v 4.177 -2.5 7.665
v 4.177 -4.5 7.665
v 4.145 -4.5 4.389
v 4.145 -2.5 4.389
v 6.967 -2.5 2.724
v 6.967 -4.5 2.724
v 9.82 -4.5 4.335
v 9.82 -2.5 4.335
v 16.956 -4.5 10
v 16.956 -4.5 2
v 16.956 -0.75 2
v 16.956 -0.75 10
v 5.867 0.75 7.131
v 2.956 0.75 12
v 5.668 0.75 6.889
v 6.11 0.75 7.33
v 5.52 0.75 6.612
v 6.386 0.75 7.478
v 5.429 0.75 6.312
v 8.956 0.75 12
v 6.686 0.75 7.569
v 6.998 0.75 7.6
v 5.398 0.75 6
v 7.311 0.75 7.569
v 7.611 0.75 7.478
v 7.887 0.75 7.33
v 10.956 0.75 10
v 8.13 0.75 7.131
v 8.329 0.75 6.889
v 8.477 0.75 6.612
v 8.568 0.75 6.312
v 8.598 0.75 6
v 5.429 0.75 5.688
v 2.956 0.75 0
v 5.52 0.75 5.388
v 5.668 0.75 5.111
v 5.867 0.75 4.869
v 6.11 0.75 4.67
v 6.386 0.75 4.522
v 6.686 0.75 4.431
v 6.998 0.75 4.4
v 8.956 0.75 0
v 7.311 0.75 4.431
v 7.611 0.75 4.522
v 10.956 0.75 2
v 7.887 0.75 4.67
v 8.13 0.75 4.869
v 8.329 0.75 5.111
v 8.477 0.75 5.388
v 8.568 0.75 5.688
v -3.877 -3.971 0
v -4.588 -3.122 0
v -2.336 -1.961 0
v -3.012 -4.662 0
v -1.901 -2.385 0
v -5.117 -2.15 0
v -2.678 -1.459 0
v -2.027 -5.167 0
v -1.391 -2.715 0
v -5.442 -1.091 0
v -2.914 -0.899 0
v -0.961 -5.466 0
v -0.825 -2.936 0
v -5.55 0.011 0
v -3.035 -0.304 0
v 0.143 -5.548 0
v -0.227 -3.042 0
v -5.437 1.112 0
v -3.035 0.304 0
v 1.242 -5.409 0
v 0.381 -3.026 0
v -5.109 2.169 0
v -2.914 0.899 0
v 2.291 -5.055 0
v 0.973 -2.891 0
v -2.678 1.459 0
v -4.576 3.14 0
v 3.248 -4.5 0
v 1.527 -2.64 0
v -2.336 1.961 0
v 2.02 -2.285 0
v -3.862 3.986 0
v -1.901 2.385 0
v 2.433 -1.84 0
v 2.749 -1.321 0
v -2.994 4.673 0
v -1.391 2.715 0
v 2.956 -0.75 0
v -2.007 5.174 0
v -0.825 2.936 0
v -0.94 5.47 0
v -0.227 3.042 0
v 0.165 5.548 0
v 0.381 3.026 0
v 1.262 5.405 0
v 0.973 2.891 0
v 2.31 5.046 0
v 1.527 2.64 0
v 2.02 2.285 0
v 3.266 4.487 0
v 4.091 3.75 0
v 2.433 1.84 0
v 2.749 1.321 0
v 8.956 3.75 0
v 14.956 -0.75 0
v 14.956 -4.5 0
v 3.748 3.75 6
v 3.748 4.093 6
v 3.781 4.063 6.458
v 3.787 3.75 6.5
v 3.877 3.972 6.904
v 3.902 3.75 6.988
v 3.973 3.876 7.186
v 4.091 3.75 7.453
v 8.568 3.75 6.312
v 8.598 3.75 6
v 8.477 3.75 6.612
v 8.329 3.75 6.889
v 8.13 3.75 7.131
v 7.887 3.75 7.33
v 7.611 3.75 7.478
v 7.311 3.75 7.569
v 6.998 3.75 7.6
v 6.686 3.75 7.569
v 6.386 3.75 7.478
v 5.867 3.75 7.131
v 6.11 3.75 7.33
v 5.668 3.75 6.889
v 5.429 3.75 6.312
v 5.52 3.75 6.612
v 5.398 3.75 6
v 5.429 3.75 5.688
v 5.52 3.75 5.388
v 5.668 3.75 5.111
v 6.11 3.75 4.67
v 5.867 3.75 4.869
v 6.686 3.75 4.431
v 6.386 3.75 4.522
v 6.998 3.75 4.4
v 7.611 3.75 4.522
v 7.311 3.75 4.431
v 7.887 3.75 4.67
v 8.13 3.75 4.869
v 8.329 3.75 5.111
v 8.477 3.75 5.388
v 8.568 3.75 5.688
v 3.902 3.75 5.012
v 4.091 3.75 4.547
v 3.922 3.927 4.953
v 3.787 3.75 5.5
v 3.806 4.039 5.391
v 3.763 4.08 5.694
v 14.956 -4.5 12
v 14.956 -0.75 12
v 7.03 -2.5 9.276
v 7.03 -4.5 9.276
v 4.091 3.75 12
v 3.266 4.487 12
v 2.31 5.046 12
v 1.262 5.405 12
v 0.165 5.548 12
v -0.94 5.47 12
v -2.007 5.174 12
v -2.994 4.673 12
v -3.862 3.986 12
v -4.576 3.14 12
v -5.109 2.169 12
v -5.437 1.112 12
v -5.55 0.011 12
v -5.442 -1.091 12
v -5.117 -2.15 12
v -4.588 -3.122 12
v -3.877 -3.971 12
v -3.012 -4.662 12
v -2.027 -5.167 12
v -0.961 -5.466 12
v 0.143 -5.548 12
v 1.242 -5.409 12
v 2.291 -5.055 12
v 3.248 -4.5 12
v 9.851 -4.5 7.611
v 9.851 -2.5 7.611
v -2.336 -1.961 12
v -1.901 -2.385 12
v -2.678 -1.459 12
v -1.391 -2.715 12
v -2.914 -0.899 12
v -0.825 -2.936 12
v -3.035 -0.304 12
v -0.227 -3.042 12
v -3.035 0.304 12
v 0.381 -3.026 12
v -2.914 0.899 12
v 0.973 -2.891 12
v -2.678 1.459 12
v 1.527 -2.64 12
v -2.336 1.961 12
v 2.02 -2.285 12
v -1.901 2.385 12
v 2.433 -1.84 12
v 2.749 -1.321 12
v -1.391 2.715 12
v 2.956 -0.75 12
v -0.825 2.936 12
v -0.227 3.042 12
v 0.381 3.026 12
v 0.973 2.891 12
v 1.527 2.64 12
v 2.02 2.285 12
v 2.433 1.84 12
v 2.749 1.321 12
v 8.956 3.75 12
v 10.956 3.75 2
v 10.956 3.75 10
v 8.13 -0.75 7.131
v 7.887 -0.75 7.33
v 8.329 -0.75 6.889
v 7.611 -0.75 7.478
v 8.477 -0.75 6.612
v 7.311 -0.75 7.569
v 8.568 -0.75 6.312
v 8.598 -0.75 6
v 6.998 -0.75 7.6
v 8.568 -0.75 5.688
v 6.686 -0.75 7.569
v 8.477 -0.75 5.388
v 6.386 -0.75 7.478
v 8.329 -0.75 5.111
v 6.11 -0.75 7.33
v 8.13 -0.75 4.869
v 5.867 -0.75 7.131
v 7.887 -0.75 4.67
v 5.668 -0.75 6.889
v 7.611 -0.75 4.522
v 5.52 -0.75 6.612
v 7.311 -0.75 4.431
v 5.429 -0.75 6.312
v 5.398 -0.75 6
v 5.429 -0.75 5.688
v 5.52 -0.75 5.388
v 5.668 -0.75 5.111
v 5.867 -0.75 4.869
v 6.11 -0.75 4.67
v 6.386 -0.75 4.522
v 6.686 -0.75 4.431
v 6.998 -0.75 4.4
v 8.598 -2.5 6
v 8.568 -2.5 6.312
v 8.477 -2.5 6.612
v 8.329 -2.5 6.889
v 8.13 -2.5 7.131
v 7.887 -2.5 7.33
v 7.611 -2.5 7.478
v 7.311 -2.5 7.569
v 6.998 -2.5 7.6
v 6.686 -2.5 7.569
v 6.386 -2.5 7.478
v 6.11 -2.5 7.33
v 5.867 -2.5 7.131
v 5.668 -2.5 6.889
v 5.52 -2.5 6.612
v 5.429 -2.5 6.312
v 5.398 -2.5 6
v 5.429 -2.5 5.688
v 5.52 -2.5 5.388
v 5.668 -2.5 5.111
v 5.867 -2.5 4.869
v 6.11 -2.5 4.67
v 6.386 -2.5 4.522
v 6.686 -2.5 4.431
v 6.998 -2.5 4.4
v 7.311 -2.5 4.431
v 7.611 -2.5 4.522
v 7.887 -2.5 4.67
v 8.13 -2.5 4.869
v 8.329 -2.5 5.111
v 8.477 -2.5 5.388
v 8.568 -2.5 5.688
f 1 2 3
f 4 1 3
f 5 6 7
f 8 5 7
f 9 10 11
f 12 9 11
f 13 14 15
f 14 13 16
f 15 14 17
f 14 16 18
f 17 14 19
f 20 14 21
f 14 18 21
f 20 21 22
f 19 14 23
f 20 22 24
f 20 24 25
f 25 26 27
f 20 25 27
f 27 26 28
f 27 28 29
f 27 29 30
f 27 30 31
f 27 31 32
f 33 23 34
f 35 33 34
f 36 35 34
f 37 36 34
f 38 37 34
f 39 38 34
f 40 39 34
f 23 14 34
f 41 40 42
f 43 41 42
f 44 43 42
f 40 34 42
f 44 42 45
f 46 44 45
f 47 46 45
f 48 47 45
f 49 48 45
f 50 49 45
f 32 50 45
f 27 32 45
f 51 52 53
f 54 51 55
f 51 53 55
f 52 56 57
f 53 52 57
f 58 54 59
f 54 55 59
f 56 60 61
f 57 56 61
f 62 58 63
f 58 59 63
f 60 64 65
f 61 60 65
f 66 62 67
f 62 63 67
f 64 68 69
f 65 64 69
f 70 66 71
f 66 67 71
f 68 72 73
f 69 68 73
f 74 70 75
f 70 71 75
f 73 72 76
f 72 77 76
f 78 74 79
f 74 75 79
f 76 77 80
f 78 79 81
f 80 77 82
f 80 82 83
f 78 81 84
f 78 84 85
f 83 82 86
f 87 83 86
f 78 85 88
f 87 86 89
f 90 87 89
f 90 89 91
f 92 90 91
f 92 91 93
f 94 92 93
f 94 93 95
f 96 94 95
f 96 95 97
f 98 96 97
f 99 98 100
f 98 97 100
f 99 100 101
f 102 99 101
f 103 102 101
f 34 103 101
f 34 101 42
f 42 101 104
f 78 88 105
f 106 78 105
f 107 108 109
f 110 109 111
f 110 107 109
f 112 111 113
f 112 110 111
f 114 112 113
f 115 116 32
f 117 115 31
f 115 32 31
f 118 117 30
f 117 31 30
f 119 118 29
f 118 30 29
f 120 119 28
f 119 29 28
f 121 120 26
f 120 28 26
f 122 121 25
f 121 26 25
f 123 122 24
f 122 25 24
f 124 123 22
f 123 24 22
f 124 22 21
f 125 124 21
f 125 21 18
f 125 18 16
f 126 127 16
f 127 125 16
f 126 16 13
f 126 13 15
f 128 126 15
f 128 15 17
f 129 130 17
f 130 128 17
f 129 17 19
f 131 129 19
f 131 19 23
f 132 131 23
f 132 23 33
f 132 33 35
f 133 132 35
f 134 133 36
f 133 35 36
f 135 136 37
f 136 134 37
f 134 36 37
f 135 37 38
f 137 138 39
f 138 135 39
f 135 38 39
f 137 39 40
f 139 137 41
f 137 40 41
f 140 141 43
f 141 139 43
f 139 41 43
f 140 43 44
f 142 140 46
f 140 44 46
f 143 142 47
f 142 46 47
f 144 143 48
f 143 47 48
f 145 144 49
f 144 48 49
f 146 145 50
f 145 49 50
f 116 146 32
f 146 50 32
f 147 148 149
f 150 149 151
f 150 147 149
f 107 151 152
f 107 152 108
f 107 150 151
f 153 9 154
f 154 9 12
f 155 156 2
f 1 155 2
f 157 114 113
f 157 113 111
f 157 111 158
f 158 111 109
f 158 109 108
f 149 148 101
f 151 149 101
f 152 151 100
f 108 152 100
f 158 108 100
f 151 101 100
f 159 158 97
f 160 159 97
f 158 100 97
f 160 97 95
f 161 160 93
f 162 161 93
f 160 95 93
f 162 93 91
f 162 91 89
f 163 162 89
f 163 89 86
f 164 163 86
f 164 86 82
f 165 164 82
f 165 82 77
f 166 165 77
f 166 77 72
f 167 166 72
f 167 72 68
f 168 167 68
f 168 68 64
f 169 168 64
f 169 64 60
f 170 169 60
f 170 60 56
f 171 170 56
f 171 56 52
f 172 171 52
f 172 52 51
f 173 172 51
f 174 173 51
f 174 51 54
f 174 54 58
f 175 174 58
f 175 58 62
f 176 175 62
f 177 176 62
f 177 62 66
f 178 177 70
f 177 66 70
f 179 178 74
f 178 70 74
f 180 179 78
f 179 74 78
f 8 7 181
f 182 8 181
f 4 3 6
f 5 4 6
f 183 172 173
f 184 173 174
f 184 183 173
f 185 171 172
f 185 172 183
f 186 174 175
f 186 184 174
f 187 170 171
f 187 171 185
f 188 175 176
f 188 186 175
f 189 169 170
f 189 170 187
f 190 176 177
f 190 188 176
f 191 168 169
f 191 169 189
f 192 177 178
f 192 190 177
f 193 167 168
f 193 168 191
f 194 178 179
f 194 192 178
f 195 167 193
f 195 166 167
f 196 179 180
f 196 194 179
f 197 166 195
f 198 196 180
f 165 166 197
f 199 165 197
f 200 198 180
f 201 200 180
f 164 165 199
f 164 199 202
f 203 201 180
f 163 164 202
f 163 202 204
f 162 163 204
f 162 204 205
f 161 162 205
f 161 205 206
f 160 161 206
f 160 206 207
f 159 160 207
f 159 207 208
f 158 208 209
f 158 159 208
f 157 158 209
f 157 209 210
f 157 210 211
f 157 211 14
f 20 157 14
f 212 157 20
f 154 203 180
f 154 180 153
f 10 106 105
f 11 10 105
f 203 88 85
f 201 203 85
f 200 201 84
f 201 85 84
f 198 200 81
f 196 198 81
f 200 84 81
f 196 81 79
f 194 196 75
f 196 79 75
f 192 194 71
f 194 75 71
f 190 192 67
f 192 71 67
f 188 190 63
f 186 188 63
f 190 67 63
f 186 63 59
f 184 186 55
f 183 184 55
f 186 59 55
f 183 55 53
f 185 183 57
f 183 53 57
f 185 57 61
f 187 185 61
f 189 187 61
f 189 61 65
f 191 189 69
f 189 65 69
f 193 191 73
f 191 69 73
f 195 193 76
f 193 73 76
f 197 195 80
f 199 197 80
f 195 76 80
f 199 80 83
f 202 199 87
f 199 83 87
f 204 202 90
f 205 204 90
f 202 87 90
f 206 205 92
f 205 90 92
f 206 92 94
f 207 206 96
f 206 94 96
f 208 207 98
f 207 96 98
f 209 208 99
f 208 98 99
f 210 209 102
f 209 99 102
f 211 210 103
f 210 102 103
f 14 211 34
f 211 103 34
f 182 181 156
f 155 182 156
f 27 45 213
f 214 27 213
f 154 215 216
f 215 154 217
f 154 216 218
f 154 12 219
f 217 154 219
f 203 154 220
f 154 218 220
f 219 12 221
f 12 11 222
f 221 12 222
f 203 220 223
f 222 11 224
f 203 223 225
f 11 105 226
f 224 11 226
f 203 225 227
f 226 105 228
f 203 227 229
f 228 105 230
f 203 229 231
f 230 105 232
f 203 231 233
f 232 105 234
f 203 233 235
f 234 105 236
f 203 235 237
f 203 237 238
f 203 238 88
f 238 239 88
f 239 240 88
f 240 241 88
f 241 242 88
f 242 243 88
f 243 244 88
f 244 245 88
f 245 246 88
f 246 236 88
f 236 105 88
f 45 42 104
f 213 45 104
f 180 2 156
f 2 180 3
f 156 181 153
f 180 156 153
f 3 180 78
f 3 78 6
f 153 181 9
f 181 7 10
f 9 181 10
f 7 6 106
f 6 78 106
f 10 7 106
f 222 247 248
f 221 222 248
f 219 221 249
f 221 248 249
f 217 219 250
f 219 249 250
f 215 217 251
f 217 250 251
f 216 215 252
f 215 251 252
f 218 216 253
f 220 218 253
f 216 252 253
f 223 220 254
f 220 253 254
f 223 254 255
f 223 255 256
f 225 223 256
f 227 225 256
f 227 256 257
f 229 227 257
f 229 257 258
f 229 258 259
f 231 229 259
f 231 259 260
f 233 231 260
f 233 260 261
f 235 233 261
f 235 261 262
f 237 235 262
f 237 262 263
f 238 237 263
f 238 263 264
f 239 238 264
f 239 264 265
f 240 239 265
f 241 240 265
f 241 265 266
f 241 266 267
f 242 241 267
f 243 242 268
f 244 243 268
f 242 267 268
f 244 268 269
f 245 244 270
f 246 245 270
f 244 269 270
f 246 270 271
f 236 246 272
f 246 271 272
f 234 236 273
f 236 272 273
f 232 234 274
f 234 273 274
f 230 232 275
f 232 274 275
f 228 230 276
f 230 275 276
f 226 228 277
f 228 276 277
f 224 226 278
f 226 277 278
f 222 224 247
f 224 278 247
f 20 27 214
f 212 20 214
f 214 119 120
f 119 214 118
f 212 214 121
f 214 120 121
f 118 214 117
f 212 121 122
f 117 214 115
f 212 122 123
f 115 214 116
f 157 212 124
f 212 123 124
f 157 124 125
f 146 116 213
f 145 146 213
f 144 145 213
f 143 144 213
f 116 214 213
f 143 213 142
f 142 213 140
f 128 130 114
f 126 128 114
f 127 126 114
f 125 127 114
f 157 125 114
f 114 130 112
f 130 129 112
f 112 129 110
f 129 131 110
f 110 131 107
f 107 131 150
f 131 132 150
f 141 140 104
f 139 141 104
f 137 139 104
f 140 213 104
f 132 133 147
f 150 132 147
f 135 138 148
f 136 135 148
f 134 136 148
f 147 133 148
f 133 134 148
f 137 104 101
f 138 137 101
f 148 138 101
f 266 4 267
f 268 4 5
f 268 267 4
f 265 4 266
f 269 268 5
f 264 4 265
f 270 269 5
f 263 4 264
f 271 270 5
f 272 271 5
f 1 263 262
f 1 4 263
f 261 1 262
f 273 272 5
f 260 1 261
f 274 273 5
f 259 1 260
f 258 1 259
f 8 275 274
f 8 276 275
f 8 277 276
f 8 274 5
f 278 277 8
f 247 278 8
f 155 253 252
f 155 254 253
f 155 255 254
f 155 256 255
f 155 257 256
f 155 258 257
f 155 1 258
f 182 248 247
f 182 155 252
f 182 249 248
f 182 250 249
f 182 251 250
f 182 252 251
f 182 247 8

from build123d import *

# Parameters (mm, degrees)
F1_DEPTH = 12
F2_R     = 1.6
F3_DEPTH = 2
F4_DEPTH = 10.051
F5_R     = 1.6
F6_DEPTH = 25
F7_SIZE  = 2


with BuildPart() as f1:
    # F0 (on Top) → F1 (new body)
    with BuildSketch(Plane.XY):
        with BuildLine():
            ThreePointArc((2.9563490998, -0.75), (-3.05, 0), (2.9563490998, 0.75))
            Line((2.9563490998, 0.75), (10.9563490998, 0.75))
            Line((10.9563490998, 0.75), (10.9563490998, 3.75))
            Line((10.9563490998, 3.75), (4.0914545091, 3.75))
            ThreePointArc((4.0914545091, 3.75), (-5.5212512675, 0.5641670326), (3.2484611742, -4.5))
            Line((3.2484611742, -4.5), (16.9563490998, -4.5))
            Line((16.9563490998, -4.5), (16.9563490998, -0.75))
            Line((16.9563490998, -0.75), (2.9563490998, -0.75))
        make_face()
    extrude(amount=F1_DEPTH)

    # F2 (on face) → F3 (cut)
    with BuildSketch(Plane.XZ.offset(4.5)):
        Polygon((9.8514510462, 7.6111043179), (7.0296988427, 9.2763138649), (4.1767089707, 7.665209547), (4.1454713021, 4.3888956821), (6.9672235056, 2.7236861351), (9.8202133776, 4.334790453), align=None)
        with Locations((6.9984611742, 6)):
            Circle(F2_R, mode=Mode.SUBTRACT)
        with Locations((6.9984611742, 6)):
            Circle(F2_R)
    extrude(amount=-F3_DEPTH, mode=Mode.SUBTRACT)

    # F2 (on face) → F4 (cut, through all)
    with BuildSketch(Plane.XZ.offset(4.5)):
        with Locations((6.9984611742, 6)):
            Circle(F2_R)
    extrude(amount=-F4_DEPTH, mode=Mode.SUBTRACT)

    # F5 (on face) → F6 (cut)
    with BuildSketch(Plane(origin=(0, 3.75, 0), x_dir=(-1, 0, 0), z_dir=(0, 1, 0))):
        with Locations((-6.9984611742, 6)):
            Circle(F5_R)
        with BuildLine():
            ThreePointArc((-4.0914545091, 4.5467924273), (-3.8353715721, 5.2534317384), (-3.7484611742, 6))
            ThreePointArc((-3.7484611742, 6), (-3.8353715721, 6.7465682616), (-4.0914545091, 7.4532075727))
            Line((-4.0914545091, 7.4532075727), (-4.0914545091, 4.5467924273))
        make_face()
    extrude(amount=F6_DEPTH, mode=Mode.SUBTRACT)

    # F7
    f7_edges = [f1.edges().sort_by_distance(p)[0] for p in [
        (16.956349, -2.625, 12),
        (16.956349, -2.625, 0),
        (10.956349, 2.25, 0),
        (10.956349, 2.25, 12),
    ]]
    chamfer(f7_edges, length=F7_SIZE)


solid = f1.part
